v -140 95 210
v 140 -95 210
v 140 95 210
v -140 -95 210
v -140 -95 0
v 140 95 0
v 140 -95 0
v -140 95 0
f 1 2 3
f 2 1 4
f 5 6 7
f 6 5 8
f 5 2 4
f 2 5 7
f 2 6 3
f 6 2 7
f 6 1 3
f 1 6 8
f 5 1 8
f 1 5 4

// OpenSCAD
// Generated documentary F1 envelope proxy.
// Not manufacturing geometry, not dimensionally validated, not SimReady.
proxy_id = "993-TURBOCHARGER-K16-RIGHT";
$fn = 96;

length_mm = 280;
width_mm = 190;
height_mm = 210;

translate([-length_mm / 2, -width_mm / 2, 0])
    cube([length_mm, width_mm, height_mm], center = false);
